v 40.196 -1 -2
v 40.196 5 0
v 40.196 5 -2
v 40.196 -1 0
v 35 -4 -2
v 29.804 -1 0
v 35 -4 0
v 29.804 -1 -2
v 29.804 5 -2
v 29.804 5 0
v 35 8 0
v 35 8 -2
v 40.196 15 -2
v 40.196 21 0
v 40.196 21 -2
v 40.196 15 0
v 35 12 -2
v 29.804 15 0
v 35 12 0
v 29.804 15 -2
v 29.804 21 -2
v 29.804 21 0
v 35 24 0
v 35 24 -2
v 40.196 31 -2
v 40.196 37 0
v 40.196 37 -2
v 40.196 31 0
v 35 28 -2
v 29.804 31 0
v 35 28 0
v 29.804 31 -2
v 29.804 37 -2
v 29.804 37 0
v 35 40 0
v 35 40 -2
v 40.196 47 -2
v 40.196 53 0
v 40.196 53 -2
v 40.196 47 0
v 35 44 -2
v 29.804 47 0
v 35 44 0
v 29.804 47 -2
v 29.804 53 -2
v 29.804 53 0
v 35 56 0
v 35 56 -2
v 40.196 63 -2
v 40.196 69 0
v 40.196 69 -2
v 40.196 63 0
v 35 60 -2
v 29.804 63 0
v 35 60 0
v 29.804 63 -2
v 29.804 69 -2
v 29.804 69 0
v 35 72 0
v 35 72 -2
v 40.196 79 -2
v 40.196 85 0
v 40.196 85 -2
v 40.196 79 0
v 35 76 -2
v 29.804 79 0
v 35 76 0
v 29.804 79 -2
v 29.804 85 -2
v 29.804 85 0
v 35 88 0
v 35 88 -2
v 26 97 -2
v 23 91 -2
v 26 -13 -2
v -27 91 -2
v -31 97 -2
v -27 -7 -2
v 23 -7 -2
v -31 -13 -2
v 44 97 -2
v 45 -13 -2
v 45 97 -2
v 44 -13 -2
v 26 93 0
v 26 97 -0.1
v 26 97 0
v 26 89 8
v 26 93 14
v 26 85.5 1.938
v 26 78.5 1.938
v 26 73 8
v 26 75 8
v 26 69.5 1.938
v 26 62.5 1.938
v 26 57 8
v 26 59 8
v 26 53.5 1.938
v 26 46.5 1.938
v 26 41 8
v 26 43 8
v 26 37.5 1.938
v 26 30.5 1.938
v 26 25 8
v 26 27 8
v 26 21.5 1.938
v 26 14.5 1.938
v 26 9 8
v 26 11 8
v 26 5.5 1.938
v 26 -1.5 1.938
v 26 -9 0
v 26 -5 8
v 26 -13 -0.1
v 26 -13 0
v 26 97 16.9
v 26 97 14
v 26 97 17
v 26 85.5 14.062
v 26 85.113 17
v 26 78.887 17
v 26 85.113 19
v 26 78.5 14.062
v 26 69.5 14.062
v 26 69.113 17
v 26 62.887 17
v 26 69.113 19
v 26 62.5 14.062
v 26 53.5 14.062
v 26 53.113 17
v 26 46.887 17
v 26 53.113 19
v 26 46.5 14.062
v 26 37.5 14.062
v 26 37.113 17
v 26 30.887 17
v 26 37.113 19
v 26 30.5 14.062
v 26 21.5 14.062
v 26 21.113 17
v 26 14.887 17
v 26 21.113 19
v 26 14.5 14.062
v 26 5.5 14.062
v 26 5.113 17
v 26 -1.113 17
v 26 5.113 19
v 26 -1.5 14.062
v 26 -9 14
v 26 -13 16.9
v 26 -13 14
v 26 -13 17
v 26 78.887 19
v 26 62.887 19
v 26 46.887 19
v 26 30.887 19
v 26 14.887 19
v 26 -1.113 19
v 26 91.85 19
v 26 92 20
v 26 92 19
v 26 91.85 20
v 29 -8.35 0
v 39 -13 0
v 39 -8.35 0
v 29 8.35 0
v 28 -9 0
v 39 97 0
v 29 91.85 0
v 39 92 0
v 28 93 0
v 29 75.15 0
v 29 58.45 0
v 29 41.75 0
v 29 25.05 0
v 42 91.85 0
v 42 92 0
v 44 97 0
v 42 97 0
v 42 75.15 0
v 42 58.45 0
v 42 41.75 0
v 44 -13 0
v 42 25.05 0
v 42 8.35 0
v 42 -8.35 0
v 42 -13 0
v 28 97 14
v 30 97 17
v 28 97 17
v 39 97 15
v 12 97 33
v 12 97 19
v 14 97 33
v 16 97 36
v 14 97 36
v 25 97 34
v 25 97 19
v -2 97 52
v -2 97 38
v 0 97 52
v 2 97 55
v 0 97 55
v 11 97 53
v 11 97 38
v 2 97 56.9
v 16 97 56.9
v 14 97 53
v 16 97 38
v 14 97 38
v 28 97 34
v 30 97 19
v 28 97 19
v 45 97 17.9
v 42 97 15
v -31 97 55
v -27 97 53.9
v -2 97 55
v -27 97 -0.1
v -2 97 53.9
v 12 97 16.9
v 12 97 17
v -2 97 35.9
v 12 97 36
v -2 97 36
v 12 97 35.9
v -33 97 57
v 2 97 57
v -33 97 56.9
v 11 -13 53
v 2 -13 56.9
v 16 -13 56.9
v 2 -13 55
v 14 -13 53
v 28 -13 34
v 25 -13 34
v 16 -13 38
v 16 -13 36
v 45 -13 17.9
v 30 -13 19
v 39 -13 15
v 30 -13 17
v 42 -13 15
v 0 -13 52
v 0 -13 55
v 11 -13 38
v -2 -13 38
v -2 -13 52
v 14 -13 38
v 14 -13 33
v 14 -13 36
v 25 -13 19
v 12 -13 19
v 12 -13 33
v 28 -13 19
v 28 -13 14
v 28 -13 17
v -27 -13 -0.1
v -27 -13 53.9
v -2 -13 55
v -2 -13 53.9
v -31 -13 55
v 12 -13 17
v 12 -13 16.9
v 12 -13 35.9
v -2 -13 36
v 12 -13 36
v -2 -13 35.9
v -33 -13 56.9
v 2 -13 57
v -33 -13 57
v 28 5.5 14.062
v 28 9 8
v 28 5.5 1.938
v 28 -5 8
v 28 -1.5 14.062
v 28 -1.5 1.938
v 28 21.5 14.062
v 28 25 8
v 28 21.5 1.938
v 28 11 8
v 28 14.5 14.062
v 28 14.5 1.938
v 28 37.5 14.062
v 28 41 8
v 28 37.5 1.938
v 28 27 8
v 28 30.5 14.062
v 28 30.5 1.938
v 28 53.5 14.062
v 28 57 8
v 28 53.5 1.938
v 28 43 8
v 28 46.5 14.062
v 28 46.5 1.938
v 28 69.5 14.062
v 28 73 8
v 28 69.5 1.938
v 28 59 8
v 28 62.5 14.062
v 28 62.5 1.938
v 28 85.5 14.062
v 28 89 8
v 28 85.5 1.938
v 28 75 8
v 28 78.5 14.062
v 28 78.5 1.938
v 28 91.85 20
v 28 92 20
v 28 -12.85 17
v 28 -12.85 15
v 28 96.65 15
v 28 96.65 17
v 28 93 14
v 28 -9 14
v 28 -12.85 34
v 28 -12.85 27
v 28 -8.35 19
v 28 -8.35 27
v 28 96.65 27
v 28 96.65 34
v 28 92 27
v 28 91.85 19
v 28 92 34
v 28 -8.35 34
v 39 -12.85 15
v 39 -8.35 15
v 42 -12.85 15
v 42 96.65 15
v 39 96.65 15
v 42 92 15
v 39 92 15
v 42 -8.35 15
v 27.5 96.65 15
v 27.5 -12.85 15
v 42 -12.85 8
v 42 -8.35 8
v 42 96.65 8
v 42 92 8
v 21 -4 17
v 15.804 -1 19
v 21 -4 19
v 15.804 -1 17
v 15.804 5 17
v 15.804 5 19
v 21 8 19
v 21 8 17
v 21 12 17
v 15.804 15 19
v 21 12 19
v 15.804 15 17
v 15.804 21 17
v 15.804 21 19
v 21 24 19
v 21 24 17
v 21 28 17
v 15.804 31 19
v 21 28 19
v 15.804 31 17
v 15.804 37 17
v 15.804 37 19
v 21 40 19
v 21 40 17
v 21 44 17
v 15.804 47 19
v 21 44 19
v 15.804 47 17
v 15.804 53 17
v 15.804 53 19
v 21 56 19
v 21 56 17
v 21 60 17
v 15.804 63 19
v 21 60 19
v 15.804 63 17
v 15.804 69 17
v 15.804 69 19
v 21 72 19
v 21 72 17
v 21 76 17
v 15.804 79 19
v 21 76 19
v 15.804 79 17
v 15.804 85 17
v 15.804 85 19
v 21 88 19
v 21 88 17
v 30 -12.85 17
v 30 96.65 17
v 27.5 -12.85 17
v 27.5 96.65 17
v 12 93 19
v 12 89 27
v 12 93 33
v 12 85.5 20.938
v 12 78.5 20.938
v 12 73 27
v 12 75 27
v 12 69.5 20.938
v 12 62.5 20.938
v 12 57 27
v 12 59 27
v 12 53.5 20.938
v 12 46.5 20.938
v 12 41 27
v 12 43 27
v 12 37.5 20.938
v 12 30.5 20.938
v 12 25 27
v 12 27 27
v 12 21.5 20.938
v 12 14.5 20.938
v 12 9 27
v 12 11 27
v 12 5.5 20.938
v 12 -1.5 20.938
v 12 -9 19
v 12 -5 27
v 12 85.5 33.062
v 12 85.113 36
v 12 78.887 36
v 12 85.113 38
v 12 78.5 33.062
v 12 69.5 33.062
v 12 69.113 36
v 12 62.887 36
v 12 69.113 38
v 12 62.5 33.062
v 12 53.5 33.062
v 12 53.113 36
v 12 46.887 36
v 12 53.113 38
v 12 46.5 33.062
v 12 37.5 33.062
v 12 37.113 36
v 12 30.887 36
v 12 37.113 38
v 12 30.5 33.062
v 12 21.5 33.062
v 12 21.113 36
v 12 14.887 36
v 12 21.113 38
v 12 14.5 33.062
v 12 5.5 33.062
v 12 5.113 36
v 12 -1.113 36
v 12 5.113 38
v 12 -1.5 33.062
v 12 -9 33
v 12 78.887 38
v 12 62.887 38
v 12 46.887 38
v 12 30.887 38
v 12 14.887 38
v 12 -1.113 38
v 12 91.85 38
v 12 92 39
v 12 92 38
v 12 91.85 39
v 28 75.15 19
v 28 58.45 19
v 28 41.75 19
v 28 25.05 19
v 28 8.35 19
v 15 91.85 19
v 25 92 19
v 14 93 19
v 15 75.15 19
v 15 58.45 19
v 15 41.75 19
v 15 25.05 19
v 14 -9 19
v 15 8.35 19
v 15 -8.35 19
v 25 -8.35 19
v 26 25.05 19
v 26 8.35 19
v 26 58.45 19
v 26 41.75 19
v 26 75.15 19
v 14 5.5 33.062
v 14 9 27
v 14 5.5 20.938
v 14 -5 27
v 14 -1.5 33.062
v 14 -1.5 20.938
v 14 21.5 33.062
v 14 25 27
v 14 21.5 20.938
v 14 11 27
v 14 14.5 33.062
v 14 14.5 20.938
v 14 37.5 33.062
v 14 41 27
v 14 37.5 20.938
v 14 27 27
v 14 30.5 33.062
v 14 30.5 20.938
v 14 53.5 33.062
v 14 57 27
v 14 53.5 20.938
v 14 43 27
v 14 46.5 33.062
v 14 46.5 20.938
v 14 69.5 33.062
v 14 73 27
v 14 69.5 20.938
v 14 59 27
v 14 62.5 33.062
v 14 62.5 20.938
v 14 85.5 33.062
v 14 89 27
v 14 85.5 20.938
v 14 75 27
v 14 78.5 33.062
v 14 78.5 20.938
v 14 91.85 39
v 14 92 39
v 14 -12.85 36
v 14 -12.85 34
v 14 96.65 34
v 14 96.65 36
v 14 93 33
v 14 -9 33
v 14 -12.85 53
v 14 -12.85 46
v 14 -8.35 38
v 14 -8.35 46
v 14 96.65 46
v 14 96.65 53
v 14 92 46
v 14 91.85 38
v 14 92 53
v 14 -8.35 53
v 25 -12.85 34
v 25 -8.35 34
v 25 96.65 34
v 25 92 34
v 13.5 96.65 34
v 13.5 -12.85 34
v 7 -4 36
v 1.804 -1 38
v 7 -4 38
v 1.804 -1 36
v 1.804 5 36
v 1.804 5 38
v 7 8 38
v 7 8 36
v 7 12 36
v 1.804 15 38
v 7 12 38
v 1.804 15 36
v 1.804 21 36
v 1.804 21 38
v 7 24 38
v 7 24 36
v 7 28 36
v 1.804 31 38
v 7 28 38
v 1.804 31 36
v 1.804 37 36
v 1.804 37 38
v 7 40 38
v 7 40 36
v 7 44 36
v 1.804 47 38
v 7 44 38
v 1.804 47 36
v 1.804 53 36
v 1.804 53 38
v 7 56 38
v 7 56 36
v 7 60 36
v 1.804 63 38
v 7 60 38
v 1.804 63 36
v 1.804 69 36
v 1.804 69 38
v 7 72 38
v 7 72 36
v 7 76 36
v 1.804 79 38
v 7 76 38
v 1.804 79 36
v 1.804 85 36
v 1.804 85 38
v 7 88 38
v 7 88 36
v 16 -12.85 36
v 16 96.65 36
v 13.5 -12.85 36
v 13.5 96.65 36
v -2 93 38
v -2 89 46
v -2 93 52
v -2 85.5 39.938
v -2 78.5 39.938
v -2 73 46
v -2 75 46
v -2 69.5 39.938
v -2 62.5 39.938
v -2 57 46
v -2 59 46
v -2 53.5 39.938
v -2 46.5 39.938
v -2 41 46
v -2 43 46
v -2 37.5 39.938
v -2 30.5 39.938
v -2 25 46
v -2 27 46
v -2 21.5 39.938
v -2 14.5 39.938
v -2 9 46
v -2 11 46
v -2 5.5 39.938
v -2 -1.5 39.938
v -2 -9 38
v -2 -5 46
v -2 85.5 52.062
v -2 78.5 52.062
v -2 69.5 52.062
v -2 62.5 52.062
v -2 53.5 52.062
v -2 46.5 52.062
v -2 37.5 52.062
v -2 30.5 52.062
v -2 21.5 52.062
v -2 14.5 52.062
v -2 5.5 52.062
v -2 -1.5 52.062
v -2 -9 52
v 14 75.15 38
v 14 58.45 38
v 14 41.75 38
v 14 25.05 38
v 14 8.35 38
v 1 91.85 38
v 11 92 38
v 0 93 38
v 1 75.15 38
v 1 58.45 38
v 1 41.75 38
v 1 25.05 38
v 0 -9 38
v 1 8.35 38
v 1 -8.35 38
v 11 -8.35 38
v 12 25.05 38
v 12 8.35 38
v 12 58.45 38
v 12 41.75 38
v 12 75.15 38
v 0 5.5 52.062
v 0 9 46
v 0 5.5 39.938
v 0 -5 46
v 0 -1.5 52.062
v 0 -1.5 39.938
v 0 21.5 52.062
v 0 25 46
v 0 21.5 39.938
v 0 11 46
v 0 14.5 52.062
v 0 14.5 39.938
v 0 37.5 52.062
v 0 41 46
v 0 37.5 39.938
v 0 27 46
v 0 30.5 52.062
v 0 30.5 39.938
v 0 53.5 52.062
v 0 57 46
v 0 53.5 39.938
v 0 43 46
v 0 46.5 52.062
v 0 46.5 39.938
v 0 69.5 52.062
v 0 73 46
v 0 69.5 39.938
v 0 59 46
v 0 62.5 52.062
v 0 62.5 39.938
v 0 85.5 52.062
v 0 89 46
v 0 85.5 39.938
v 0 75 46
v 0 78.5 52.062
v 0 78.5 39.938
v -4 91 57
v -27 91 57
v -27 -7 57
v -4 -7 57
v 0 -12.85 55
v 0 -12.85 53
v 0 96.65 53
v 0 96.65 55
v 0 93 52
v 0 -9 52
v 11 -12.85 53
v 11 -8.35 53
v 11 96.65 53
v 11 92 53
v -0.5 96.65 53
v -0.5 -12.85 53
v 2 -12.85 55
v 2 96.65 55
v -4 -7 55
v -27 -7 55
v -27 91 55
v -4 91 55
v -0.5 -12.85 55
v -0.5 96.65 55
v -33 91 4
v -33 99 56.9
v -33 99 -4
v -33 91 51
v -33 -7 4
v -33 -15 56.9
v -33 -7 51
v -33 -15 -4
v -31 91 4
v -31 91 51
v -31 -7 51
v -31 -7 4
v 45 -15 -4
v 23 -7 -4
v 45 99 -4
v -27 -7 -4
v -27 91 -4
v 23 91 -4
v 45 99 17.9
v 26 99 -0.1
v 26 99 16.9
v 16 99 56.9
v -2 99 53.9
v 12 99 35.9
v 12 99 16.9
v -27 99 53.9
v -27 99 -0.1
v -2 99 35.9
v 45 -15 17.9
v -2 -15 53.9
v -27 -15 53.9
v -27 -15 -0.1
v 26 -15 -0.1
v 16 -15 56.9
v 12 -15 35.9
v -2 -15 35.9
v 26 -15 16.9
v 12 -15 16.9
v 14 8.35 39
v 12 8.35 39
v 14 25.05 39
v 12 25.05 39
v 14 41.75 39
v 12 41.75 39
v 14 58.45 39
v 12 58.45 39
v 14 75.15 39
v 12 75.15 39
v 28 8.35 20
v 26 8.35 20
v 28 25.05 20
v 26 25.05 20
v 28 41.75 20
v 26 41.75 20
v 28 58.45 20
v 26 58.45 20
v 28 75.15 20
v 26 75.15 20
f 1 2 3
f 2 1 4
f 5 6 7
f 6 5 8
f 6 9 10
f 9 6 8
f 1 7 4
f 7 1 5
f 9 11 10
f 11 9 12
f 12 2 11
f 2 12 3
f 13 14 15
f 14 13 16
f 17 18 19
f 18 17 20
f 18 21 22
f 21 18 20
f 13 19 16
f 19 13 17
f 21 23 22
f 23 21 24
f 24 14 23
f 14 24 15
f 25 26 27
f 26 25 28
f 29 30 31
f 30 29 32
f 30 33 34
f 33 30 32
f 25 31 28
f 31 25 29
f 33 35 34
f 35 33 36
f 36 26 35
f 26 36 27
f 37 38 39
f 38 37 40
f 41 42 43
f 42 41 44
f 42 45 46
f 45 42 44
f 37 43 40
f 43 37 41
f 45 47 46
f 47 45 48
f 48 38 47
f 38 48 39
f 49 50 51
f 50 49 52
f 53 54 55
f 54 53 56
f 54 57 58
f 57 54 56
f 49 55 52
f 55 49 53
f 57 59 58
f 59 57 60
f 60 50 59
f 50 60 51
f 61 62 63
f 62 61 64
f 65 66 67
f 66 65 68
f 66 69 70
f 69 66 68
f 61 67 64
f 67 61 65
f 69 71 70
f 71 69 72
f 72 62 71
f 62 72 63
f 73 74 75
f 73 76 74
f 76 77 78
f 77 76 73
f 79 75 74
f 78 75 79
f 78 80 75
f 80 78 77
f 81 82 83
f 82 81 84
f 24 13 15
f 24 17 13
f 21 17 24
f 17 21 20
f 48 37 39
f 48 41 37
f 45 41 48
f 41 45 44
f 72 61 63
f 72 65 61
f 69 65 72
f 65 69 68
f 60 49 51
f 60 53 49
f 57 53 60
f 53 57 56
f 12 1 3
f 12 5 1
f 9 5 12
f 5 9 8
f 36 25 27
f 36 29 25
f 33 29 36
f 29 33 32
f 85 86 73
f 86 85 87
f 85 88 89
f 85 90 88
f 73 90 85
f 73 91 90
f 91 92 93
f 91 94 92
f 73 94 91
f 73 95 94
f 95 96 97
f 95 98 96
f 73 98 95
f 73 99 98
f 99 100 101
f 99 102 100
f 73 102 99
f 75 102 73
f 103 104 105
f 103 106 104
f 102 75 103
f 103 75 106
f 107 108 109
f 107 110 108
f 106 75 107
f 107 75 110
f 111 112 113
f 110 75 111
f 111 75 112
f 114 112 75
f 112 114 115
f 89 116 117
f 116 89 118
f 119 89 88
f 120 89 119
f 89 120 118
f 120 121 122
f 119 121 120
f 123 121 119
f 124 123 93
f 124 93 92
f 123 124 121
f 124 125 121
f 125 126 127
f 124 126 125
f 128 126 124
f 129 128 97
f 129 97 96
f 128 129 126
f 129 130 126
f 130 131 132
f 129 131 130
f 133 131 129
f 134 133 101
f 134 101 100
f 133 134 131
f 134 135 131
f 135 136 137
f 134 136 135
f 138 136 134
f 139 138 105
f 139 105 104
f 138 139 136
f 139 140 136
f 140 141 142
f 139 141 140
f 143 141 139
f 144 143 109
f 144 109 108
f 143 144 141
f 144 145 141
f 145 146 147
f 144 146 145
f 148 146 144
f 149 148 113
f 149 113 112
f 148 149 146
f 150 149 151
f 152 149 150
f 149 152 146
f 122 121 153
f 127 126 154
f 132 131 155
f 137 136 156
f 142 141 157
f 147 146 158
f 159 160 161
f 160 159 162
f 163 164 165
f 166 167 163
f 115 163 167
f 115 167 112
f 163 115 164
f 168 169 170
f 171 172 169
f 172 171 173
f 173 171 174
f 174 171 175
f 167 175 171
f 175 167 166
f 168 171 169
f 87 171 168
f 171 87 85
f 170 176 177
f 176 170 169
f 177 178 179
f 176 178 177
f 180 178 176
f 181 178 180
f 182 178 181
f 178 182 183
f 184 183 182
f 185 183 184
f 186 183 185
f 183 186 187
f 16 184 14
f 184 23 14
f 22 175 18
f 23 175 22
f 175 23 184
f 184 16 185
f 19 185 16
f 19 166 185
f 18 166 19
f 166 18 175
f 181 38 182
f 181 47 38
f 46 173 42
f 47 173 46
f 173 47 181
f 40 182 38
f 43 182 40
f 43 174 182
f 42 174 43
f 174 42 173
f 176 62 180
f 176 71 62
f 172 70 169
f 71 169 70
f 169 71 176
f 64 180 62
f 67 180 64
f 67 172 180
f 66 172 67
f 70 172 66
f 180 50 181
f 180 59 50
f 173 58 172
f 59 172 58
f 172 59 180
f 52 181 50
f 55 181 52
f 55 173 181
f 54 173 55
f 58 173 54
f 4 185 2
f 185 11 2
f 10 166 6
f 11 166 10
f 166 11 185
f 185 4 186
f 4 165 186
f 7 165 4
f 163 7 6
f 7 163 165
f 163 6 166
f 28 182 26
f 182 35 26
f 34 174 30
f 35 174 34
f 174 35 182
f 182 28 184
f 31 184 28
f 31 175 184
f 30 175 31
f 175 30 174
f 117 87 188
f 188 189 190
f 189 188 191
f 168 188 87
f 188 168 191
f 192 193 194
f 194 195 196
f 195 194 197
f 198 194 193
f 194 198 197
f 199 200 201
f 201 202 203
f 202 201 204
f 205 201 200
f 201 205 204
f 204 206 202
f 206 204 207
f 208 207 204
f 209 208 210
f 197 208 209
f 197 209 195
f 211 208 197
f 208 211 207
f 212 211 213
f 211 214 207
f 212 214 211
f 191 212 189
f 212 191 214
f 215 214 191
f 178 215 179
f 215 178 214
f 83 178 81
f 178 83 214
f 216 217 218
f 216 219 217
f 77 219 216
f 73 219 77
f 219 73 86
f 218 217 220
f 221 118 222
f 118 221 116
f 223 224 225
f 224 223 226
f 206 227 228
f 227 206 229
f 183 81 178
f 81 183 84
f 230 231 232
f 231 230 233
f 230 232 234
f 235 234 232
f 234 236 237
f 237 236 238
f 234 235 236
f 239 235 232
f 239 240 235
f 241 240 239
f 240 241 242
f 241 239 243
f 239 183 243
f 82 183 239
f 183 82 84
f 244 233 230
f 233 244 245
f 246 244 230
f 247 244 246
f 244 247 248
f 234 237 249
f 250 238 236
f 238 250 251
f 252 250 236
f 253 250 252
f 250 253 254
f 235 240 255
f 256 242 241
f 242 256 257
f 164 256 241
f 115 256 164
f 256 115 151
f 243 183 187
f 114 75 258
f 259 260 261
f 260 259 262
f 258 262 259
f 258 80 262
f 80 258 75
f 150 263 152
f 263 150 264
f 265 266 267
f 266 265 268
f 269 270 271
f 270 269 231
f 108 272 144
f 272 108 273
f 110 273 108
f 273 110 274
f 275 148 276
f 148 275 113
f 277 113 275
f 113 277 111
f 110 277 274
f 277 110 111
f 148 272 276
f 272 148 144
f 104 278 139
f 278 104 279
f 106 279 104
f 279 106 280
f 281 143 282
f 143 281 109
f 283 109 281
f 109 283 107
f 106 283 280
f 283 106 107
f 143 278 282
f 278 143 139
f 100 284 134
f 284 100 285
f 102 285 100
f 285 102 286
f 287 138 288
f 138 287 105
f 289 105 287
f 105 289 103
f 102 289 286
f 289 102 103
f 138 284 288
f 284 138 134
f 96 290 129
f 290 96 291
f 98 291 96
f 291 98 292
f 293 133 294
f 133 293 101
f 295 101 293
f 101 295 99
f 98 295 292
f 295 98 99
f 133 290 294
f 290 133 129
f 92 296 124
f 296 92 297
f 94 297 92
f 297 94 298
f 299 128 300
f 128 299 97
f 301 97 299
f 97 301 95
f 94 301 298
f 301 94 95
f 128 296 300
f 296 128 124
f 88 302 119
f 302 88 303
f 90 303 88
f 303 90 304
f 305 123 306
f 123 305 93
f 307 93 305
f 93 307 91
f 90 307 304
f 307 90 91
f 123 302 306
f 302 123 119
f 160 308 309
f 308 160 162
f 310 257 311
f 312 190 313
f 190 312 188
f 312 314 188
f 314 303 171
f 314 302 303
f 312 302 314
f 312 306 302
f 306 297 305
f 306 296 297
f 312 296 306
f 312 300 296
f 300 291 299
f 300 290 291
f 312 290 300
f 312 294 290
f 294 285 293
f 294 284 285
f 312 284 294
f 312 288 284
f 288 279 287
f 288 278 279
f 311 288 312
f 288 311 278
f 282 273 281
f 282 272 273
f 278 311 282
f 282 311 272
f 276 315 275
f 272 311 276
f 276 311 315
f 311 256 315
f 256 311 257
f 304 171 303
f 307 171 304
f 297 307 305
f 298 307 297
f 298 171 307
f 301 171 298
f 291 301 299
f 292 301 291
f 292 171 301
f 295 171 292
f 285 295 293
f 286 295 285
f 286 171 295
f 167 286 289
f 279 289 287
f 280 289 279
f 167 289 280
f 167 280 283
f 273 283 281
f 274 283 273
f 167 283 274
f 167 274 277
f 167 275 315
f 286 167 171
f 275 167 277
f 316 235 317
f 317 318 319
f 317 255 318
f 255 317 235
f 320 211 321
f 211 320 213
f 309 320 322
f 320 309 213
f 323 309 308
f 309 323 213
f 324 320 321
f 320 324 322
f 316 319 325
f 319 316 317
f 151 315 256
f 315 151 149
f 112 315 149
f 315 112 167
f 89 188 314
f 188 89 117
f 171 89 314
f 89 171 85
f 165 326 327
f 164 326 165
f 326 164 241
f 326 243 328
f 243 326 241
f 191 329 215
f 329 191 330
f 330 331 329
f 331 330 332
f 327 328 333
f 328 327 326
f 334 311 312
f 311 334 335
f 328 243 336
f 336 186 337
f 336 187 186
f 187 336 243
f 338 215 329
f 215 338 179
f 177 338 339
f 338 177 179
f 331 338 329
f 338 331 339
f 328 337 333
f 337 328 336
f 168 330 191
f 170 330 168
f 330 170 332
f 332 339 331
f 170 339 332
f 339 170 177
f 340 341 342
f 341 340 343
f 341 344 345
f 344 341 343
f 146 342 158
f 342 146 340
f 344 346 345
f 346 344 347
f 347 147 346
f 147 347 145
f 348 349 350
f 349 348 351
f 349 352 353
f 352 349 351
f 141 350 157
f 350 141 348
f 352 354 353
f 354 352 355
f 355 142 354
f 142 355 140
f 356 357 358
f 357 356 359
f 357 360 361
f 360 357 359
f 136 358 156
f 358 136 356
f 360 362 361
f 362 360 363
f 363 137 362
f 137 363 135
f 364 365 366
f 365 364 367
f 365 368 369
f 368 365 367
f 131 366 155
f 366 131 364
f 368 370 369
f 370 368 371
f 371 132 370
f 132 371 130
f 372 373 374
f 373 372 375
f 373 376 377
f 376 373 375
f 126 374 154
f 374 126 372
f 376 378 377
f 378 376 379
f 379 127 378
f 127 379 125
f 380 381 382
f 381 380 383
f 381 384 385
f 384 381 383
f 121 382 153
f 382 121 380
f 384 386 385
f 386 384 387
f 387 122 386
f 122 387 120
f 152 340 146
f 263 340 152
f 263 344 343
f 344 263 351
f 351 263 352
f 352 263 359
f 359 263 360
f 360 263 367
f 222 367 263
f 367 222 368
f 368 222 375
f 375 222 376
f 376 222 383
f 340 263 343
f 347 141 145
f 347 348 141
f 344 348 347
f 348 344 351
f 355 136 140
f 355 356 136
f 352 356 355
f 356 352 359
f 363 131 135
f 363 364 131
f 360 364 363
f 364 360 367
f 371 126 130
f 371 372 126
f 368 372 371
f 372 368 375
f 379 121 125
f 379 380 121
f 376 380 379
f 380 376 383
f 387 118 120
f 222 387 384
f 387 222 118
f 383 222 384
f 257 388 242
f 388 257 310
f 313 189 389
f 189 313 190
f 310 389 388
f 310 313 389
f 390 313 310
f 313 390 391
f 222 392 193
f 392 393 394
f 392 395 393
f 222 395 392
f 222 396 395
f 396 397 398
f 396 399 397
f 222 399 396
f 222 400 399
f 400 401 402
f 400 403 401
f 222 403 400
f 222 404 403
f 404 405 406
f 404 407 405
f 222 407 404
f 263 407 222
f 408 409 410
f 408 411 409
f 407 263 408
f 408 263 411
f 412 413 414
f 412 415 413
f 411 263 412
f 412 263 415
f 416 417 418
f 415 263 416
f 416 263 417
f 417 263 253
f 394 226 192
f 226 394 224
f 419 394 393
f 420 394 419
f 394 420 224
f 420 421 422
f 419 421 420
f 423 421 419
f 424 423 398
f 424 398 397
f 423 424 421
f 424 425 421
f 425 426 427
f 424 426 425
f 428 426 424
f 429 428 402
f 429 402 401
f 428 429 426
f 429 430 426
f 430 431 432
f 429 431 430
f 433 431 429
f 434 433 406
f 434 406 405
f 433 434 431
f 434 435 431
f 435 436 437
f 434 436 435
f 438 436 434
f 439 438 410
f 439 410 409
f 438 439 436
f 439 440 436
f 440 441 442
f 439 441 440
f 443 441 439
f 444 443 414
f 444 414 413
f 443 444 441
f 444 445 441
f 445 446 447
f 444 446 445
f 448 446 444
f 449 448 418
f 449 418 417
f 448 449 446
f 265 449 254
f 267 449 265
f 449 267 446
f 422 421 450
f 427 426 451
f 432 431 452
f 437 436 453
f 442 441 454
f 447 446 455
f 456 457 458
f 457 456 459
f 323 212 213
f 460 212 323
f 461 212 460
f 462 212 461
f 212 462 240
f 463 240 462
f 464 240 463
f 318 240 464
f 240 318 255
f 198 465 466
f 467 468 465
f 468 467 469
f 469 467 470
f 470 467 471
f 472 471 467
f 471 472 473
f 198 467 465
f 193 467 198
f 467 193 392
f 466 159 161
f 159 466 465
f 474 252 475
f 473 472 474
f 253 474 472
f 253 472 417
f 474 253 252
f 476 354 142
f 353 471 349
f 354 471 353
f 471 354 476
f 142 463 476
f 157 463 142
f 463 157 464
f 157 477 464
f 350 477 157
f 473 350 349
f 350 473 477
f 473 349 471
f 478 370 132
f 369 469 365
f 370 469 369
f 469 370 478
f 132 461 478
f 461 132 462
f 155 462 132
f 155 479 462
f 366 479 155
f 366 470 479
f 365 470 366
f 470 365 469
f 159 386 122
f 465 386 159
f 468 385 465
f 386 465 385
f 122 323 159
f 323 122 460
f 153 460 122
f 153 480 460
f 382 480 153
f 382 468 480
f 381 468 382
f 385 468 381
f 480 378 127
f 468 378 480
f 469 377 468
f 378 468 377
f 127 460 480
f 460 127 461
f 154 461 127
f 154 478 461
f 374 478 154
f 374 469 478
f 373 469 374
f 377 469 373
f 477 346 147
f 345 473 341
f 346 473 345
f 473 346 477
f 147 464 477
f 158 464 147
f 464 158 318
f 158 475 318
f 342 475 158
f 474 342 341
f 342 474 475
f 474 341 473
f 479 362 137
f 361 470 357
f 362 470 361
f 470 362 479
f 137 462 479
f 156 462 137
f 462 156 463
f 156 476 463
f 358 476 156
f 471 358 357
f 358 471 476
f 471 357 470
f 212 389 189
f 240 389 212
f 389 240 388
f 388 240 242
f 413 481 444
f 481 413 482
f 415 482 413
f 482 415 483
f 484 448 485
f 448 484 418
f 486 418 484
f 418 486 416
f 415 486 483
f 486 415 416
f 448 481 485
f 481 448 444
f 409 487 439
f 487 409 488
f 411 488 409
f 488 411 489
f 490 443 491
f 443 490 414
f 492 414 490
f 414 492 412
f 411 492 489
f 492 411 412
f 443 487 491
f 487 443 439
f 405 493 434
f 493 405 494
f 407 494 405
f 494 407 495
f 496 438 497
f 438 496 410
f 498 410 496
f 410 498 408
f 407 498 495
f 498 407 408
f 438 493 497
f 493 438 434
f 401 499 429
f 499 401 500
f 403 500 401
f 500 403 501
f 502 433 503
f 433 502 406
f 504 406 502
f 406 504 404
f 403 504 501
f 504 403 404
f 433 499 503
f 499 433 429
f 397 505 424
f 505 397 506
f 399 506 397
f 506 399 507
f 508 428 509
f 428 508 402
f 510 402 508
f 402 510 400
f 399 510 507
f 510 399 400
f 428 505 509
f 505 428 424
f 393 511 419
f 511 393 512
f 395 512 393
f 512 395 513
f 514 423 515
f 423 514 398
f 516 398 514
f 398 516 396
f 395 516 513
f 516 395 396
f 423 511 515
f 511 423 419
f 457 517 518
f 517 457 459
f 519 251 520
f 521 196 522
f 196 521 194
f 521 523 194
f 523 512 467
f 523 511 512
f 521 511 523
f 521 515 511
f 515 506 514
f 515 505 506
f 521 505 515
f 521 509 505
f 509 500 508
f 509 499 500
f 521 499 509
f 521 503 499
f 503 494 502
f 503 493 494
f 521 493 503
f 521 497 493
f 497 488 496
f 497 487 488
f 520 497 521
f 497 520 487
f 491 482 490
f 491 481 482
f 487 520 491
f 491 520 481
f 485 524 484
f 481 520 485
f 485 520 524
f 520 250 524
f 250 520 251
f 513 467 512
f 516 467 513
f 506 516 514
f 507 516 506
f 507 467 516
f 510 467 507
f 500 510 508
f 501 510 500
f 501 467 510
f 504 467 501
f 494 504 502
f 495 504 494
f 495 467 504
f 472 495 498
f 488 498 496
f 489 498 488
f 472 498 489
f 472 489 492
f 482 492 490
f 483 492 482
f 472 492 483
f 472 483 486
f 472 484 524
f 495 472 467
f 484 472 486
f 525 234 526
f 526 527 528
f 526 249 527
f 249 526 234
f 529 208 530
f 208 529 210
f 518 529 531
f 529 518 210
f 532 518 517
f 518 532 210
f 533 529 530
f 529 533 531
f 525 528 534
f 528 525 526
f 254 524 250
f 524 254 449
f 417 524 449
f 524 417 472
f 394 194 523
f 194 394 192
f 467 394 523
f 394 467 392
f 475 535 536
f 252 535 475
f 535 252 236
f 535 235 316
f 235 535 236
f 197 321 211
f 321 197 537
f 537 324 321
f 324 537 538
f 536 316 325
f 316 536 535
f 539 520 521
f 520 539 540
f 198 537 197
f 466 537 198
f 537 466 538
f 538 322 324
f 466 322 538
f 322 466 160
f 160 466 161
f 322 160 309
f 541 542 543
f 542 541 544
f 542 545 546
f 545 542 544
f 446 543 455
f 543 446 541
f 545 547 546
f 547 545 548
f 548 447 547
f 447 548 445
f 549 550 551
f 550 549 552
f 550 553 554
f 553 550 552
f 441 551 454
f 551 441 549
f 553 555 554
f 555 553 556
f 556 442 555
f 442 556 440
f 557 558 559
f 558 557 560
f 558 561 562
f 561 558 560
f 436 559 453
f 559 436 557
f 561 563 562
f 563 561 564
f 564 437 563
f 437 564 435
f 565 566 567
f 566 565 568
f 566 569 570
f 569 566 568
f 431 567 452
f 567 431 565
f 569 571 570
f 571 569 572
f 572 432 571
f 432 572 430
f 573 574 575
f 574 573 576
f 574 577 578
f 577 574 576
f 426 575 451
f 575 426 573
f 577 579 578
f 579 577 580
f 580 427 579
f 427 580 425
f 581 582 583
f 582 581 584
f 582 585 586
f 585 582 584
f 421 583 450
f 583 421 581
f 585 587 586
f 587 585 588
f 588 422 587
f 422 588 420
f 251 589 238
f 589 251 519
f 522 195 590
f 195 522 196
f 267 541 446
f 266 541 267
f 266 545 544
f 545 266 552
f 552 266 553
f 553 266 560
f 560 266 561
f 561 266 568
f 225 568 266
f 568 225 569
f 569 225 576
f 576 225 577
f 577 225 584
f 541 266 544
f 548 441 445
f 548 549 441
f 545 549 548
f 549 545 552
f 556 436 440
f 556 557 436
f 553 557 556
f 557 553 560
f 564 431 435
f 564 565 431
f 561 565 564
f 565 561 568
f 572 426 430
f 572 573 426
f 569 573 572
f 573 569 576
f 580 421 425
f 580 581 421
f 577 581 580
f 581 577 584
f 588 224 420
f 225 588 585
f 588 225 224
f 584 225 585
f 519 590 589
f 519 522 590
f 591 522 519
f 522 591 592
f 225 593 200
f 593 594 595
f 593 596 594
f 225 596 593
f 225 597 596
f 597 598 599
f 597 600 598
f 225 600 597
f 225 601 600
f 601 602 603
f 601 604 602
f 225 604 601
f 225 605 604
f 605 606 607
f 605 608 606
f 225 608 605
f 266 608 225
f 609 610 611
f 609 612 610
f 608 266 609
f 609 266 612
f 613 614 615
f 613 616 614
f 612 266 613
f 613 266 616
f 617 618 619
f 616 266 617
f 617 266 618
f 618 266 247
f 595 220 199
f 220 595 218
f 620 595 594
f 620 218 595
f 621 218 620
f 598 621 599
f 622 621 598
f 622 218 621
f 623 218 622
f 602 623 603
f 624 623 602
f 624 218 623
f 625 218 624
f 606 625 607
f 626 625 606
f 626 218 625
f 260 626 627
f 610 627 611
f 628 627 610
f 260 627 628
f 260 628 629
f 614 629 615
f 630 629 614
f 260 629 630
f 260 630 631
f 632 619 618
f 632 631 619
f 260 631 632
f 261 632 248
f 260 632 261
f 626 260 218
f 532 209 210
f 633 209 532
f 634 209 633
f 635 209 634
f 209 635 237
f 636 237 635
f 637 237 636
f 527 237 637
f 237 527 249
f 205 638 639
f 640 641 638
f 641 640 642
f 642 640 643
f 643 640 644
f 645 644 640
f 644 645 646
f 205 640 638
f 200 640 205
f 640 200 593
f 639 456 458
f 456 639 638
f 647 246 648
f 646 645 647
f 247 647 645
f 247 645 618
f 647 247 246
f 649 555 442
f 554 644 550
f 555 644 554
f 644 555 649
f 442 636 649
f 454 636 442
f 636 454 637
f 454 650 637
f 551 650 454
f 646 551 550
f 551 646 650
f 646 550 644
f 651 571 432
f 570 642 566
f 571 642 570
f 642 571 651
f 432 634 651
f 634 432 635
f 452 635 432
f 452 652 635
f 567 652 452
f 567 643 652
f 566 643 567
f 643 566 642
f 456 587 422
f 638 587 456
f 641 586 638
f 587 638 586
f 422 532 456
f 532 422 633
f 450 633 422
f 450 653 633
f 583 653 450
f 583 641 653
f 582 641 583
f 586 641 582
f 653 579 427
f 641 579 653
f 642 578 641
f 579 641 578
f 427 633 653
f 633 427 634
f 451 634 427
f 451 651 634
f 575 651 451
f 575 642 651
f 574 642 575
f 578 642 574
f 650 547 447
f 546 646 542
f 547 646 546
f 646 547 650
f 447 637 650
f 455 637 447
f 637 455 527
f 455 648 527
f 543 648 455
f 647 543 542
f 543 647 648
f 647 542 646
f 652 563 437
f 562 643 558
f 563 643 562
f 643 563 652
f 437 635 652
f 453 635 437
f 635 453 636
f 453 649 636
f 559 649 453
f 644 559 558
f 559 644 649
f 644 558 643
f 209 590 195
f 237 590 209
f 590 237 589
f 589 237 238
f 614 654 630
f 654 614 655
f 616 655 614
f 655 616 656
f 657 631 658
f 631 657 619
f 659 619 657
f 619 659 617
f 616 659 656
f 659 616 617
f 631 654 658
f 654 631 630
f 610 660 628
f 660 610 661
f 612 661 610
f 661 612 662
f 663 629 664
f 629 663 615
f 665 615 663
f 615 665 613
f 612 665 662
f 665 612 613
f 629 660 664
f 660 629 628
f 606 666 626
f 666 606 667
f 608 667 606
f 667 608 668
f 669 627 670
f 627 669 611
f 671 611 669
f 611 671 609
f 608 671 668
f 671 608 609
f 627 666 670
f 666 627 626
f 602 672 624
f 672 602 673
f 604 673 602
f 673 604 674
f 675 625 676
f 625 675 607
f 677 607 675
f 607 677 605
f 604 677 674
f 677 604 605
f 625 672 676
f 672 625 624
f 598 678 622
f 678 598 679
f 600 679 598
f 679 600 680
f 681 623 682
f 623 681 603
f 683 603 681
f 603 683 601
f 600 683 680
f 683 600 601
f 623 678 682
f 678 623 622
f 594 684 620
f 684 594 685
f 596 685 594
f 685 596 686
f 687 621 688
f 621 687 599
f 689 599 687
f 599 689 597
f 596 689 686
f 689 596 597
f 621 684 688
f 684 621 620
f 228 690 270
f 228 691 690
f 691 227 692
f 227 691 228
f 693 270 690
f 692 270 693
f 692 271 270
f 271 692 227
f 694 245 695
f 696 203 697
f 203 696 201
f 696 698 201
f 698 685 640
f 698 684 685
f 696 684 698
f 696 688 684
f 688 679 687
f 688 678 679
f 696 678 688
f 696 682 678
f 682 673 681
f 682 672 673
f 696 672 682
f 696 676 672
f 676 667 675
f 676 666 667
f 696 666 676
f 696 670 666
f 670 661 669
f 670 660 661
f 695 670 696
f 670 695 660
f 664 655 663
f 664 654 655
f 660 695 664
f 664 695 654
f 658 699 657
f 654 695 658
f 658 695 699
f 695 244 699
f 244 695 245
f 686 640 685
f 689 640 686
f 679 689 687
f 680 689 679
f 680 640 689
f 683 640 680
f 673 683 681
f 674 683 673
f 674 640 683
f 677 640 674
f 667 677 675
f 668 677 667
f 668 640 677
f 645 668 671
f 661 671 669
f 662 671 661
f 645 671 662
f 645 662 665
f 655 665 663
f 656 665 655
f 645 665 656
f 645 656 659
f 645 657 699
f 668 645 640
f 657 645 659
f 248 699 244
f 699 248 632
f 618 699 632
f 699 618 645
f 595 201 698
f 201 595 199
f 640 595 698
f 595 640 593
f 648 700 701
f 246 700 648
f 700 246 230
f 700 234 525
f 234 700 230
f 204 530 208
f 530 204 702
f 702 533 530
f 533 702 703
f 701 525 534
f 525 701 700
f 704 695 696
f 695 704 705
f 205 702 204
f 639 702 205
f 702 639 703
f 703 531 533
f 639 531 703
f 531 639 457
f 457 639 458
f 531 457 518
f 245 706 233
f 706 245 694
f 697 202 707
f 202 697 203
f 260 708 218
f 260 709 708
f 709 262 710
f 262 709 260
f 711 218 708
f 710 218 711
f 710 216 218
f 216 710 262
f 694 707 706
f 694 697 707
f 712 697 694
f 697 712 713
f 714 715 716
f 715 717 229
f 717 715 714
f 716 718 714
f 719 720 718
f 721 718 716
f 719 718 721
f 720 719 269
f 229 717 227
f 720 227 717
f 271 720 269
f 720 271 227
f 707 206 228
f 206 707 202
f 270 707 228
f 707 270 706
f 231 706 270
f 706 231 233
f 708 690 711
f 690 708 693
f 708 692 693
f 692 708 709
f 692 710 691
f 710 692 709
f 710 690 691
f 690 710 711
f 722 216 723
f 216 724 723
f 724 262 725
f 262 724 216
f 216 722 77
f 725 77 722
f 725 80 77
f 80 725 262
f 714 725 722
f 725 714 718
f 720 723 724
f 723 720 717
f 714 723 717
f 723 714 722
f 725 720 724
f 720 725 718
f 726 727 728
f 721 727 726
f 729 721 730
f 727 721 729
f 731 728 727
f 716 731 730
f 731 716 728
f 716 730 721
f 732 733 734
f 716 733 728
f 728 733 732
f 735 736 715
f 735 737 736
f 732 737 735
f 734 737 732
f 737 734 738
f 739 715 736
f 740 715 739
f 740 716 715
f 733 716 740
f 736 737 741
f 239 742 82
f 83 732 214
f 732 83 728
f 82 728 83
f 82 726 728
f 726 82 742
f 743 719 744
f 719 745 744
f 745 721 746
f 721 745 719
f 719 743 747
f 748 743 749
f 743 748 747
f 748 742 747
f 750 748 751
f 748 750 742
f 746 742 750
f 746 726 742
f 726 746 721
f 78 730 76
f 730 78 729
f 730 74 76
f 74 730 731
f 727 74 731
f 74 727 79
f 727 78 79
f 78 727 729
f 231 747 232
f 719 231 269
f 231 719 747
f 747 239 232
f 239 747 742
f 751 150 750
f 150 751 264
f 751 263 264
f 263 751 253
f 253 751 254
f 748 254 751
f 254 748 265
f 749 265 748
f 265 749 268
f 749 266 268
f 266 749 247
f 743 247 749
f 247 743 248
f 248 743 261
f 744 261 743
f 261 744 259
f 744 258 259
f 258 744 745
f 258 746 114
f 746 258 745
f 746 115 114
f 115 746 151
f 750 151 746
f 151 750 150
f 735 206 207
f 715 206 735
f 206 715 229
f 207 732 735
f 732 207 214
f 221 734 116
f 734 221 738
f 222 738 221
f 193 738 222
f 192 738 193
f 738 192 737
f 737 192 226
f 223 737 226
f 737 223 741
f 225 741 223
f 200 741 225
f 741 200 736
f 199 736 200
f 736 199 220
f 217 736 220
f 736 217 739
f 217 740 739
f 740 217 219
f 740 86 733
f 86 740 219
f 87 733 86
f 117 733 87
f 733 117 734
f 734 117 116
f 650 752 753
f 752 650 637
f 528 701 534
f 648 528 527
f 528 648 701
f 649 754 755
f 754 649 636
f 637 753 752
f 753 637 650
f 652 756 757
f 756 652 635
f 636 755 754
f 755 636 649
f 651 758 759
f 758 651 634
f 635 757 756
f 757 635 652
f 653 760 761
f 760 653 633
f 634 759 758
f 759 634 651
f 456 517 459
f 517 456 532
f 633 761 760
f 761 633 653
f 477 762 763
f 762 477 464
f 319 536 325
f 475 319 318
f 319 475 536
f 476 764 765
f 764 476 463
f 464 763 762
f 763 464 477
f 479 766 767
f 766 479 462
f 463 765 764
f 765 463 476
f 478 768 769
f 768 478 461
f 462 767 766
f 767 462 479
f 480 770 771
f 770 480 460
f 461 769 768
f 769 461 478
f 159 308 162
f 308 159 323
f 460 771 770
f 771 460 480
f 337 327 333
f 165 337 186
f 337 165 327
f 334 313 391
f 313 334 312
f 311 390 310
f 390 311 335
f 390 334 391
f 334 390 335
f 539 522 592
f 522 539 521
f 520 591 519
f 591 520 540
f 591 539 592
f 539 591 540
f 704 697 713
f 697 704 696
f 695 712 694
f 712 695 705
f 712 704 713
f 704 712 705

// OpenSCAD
// file: Lights2a.scad
// Lights1a
// headblock for leds, fibers insert with ferrules Lights1b part

module Rx1(){
tol=0.20;
Off1 = 1.15;

difference(){
// Rx body
translate([-4,-8.35,-8]) color("cyan")
linear_extrude(height=15) square(size=[13,16.7]);


rotate([0,90,0])
//difference(){
union(){
//------------
// First jacket
translate([0,0,16]) color("green")
cylinder(r1=4+tol,r2=2+tol,h=20,$fn=22);

//------------
// Narrow part
translate([0,0,6]) color("pink")
cylinder(r1=3+tol,r2=3+tol,h=3,$fn=22);
/*
//------------
// wide part
translate([0,0,9]) color("red")
cylinder(r1=5+tol,r2=5+tol,h=3,$fn=12);
translate([0,0,12]) color("red")
cylinder(r1=4+tol,r2=4+tol,h=2,$fn=12);
translate([0,0,14]) color("red")
cylinder(r1=5+tol,r2=5+tol,h=3,$fn=12);
*/
//-------------
//  head
translate([0,0,0]) color("orange")
cylinder(r1=5+tol,r2=5+tol,h=6,$fn=22);

}

//-------
// Fiber
//color("cyan")
//cylinder(r1=1.6,r2=1.7, h=50,$fn=22);
//}

//==========
// led tape and chip
translate([-1.85,-20,-6])
//linear_extrude(height=12) square(size=[0.2+tol,40]);
linear_extrude(height=16) square(size=[0.2+tol,40]);
translate([-1.65,-2.5-tol/2-Off1,-2.5-tol/2])
linear_extrude(height=5+tol) square(size=[1.65+tol,5+tol]);

//-------
// cut for the ferrule head
translate([1.85+tol,0,0]) color("cyan")
linear_extrude(height=10) square(size=[1.85+6,10],center=true);

// cut for the ferrule neck
translate([7,0,0]) color("cyan")
linear_extrude(height=10,scale=1.3) square(size=[6,5.0],center=true);

/*
// cuts to create spring action on led
translate([-3,-3-Off1,-6]) color("pink")
linear_extrude(height=14) square(size=[3,0.5],center=true);
translate([-3,3-Off1,-6]) color("pink")
linear_extrude(height=14) square(size=[3,0.5],center=true);
translate([-4,-Off1,-6]) color("pink")
linear_extrude(height=14,scale=[3,1]) square(size=[1,6],center=true);

// cuts to create spring action on ferrule
translate([7,-5.5,1]) color("pink") rotate([-15,0,0])
linear_extrude(height=8) square(size=[4,0.5],center=true);
translate([7,5.5,1]) color("pink") rotate([15,0,0])
linear_extrude(height=8) square(size=[4,0.5],center=true);
*/

// material reduction on sidewalls
// possible locking mechanism?
translate([3,-20,4]) color("green") rotate([-90,-90,0]){
cylinder(r=3.0,h=40,$fn=40);
    translate([3,0,0])
    linear_extrude(height=40) square(6,center=true);
}
}

}


for(i=[0:0]){
    translate([0,16.7*i,0]) Rx1();
}


//-------------------- simplified model for cutouts
module Rx2(){
tol=0.20;
Off1 = 1.25;

difference(){
// Rx body
translate([-4,-8.35,-8]) color("cyan")
linear_extrude(height=15) square(size=[13,16.7]);


rotate([0,90,0])
//difference(){
union(){
//------------
// Narrow part
translate([0,0,6]) color("pink")
cylinder(r1=3+tol,r2=3+tol,h=3,$fn=22);
//-------------
//  head
translate([0,0,0]) color("orange")
cylinder(r1=5+tol,r2=5+tol,h=6,$fn=22);

}

// led tape and chip
translate([-1.85,-20,-6])
//linear_extrude(height=12) square(size=[0.2+tol,40]);
linear_extrude(height=16) square(size=[0.2+tol,40]);
translate([-1.65,-2.5-tol/2-Off1,-2.5-tol/2])
linear_extrude(height=5+tol) square(size=[1.65+tol,5+tol]);

//-------
// cut for the ferrule head
translate([1.85+tol,0,0]) color("cyan")
linear_extrude(height=10) square(size=[1.85+6,10],center=true);

// cut for the ferrule neck
translate([7,0,0]) color("cyan")
linear_extrude(height=10) square(size=[6,5.5],center=true);

}

}

/*
translate([20,20,0])
Rx2();
*/
// main file
// BikeLights2c
// 
use <Lights2a.scad>

// -----------------------------------------
module Lid1(){
translate([27.5,-16.7/2-4.5,15])
linear_extrude(height=2)
square(size=[16-0.25,109.5]);

difference(){
    translate([14+2*14,-16.7/2-4.5,8])
    linear_extrude(height=9)
    square(size=[2,109.5]);

    for(j=[0:5]){
    translate([14+2*14,16.7*j,8]) rotate([0,90,0])
    cylinder(r1=6,r2=8,h=4);
    }

}

}
// -----------------------------------------
difference(){
// bookshelf 
union(){
    translate([26,-13,-2]) color("orange"){
    difference(){
    linear_extrude(height=2)
    square(size=[18,110]);

    for(k=[0:5]){
        translate([9,15+16*k,-6])
        linear_extrude(height=14)
        rotate([0,0,30])
        circle(r=6,$fn=6);
    }
}
}

translate([26,-13,-2]) color("pink"){

translate([13,0,0])
linear_extrude(height=17)
square(size=[3,5]);

translate([13,105,0])
linear_extrude(height=17)
square(size=[3,5]);

translate([0,0,0])
difference(){
    linear_extrude(height=22)
    square(size=[2,110]);
    
    translate([0,0,0])
    linear_extrude(height=16)
    square(size=[6,4]);
    
    translate([0,106,0])
    linear_extrude(height=16)
    square(size=[6,4]);

    for(k=[0:5]){
        translate([0,15+16*k,10])
        rotate([0,90,0])
        linear_extrude(height=4)
        rotate([0,0,30])
        circle(r=7,$fn=6);
    }
}
}

translate([12,-13,17]) color("orange"){
    difference(){
    linear_extrude(height=2)
    square(size=[18,110]);

    for(k=[0:5]){
        translate([9,15+16*k,-6])
        linear_extrude(height=14)
        rotate([0,0,30])
        circle(r=6,$fn=6);
    }
}
}

translate([12,-13,17]) color("pink"){
translate([13,0,0])
linear_extrude(height=17)
square(size=[3,5]);
translate([13,105,0])
linear_extrude(height=17)
square(size=[3,5]);

difference(){
    linear_extrude(height=22)
    square(size=[2,110]);
    
    translate([0,0,0])
    linear_extrude(height=16)
    square(size=[6,4]);
    
    translate([0,106,0])
    linear_extrude(height=16)
    square(size=[6,4]);
    for(k=[0:5]){
        translate([0,15+16*k,10])
        rotate([0,90,0])
        linear_extrude(height=4)
        rotate([0,0,30])
        circle(r=7,$fn=6);
    }
}
}
translate([-2,-13,36]) color("orange"){
    difference(){
    linear_extrude(height=2)
    square(size=[18,110]);

    for(k=[0:5]){
        translate([9,15+16*k,-6])
        linear_extrude(height=14)
        rotate([0,0,30])
        circle(r=6,$fn=6);
    }
}
}

translate([-2,-13,36]) color("pink"){
translate([13,0,0])
linear_extrude(height=17)
square(size=[3,5]);
translate([13,105,0])
linear_extrude(height=17)
square(size=[3,5]);

difference(){
    linear_extrude(height=21)
    square(size=[2,110]);
    
    translate([0,0,0])
    linear_extrude(height=16)
    square(size=[6,4]);
    
    translate([0,106,0])
    linear_extrude(height=16)
    square(size=[6,4]);
    for(k=[0:5]){
        translate([0,15+16*k,10])
        rotate([0,90,0])
        linear_extrude(height=4)
        rotate([0,0,30])
        circle(r=7,$fn=6);
    }
}
}

// topside
translate([-33,-13,55]) color("orange")
difference(){
    linear_extrude(height=2)
    square(size=[35,110]);    
    linear_extrude(height=2)
    offset(r=-6)
    square(size=[35,110]);
}
translate([-33,-13,-2]) color("pink")
difference(){
    linear_extrude(height=59)
    square(size=[2,110]);
    translate([0,6,6])
    linear_extrude(height=59-12)
    square(size=[2,110-12]);
}
translate([-33,-15,-4]) color("blue")
difference(){
    linear_extrude(height=2)
    square(size=[78,114]);
    translate([6,8,0])
    linear_extrude(height=2)
    square(size=[50,98]);
}


//----- sidewalls
p3=[ [-33,-2], [45,-2], [45,18], [16,57], 
[-33,57] ];
p4=[ [-27,0], [26,0], [26,17], [12,17], [12,36], [-2,36], [-2,54], [-27,54] ];

translate([0,-13,-0.1])
rotate([90,0,0]) color("green")
difference(){
    linear_extrude(height=2) 
    polygon(points=p3);

    linear_extrude(height=2) 
    polygon(points=p4);
}

translate([0,-13+112,-0.1])
rotate([90,0,0]) color("green")

difference(){
    linear_extrude(height=2) 
    polygon(points=p3);

    linear_extrude(height=2) 
    polygon(points=p4);
}

}


//--------------------------------------------
// Three rows of connectors
for(i=[0:5]){
    translate([5,16.7*i,46]) Rx2();
}
for(i=[0:5]){
    translate([5+14,16.7*i,27]) Rx2();
}
for(i=[0:5]){
    translate([5+2*14,16.7*i,8]) Rx2();
}

Lid1();
translate([-14,0,19]) Lid1();
translate([-14*2,0,19*2]) Lid1();

}

/*

translate([-2,8,0]) rotate([0,-90,0])
union(){
// 7a chassis
B1p=[ [0,1], [1,0], [53,0], [54,1], [54,79], [48,85], [6,85], [0,79] ];
translate([0,0,0]) color("gray")
linear_extrude(height=16)
polygon(points=B1p);
// wiring rises above chassis
linear_extrude(height=26)
offset(r=-2) polygon(points=B1p);

// Switch 1
translate([2,1.6,0]) color("blue"){
    union(){
        // switch body including solder lug clearance
        linear_extrude(height=12) 
        offset(r=tol)
         square(size=[13, 15]);
        
        translate([6.5,0,5]) rotate([90,0,0]) cylinder(r=3.3,h=10,$fn=30);
    }
}
// Switch 2
translate([54-15,1.6,0]) color("blue"){
    union(){
        // switch body including solder lug clearance
        linear_extrude(height=12) 
        offset(r=tol)
         square(size=[13, 15]);
        
        translate([6.5,0,5]) rotate([90,0,0]) cylinder(r=3.3,h=10,$fn=30);
    }
}
}

*/
